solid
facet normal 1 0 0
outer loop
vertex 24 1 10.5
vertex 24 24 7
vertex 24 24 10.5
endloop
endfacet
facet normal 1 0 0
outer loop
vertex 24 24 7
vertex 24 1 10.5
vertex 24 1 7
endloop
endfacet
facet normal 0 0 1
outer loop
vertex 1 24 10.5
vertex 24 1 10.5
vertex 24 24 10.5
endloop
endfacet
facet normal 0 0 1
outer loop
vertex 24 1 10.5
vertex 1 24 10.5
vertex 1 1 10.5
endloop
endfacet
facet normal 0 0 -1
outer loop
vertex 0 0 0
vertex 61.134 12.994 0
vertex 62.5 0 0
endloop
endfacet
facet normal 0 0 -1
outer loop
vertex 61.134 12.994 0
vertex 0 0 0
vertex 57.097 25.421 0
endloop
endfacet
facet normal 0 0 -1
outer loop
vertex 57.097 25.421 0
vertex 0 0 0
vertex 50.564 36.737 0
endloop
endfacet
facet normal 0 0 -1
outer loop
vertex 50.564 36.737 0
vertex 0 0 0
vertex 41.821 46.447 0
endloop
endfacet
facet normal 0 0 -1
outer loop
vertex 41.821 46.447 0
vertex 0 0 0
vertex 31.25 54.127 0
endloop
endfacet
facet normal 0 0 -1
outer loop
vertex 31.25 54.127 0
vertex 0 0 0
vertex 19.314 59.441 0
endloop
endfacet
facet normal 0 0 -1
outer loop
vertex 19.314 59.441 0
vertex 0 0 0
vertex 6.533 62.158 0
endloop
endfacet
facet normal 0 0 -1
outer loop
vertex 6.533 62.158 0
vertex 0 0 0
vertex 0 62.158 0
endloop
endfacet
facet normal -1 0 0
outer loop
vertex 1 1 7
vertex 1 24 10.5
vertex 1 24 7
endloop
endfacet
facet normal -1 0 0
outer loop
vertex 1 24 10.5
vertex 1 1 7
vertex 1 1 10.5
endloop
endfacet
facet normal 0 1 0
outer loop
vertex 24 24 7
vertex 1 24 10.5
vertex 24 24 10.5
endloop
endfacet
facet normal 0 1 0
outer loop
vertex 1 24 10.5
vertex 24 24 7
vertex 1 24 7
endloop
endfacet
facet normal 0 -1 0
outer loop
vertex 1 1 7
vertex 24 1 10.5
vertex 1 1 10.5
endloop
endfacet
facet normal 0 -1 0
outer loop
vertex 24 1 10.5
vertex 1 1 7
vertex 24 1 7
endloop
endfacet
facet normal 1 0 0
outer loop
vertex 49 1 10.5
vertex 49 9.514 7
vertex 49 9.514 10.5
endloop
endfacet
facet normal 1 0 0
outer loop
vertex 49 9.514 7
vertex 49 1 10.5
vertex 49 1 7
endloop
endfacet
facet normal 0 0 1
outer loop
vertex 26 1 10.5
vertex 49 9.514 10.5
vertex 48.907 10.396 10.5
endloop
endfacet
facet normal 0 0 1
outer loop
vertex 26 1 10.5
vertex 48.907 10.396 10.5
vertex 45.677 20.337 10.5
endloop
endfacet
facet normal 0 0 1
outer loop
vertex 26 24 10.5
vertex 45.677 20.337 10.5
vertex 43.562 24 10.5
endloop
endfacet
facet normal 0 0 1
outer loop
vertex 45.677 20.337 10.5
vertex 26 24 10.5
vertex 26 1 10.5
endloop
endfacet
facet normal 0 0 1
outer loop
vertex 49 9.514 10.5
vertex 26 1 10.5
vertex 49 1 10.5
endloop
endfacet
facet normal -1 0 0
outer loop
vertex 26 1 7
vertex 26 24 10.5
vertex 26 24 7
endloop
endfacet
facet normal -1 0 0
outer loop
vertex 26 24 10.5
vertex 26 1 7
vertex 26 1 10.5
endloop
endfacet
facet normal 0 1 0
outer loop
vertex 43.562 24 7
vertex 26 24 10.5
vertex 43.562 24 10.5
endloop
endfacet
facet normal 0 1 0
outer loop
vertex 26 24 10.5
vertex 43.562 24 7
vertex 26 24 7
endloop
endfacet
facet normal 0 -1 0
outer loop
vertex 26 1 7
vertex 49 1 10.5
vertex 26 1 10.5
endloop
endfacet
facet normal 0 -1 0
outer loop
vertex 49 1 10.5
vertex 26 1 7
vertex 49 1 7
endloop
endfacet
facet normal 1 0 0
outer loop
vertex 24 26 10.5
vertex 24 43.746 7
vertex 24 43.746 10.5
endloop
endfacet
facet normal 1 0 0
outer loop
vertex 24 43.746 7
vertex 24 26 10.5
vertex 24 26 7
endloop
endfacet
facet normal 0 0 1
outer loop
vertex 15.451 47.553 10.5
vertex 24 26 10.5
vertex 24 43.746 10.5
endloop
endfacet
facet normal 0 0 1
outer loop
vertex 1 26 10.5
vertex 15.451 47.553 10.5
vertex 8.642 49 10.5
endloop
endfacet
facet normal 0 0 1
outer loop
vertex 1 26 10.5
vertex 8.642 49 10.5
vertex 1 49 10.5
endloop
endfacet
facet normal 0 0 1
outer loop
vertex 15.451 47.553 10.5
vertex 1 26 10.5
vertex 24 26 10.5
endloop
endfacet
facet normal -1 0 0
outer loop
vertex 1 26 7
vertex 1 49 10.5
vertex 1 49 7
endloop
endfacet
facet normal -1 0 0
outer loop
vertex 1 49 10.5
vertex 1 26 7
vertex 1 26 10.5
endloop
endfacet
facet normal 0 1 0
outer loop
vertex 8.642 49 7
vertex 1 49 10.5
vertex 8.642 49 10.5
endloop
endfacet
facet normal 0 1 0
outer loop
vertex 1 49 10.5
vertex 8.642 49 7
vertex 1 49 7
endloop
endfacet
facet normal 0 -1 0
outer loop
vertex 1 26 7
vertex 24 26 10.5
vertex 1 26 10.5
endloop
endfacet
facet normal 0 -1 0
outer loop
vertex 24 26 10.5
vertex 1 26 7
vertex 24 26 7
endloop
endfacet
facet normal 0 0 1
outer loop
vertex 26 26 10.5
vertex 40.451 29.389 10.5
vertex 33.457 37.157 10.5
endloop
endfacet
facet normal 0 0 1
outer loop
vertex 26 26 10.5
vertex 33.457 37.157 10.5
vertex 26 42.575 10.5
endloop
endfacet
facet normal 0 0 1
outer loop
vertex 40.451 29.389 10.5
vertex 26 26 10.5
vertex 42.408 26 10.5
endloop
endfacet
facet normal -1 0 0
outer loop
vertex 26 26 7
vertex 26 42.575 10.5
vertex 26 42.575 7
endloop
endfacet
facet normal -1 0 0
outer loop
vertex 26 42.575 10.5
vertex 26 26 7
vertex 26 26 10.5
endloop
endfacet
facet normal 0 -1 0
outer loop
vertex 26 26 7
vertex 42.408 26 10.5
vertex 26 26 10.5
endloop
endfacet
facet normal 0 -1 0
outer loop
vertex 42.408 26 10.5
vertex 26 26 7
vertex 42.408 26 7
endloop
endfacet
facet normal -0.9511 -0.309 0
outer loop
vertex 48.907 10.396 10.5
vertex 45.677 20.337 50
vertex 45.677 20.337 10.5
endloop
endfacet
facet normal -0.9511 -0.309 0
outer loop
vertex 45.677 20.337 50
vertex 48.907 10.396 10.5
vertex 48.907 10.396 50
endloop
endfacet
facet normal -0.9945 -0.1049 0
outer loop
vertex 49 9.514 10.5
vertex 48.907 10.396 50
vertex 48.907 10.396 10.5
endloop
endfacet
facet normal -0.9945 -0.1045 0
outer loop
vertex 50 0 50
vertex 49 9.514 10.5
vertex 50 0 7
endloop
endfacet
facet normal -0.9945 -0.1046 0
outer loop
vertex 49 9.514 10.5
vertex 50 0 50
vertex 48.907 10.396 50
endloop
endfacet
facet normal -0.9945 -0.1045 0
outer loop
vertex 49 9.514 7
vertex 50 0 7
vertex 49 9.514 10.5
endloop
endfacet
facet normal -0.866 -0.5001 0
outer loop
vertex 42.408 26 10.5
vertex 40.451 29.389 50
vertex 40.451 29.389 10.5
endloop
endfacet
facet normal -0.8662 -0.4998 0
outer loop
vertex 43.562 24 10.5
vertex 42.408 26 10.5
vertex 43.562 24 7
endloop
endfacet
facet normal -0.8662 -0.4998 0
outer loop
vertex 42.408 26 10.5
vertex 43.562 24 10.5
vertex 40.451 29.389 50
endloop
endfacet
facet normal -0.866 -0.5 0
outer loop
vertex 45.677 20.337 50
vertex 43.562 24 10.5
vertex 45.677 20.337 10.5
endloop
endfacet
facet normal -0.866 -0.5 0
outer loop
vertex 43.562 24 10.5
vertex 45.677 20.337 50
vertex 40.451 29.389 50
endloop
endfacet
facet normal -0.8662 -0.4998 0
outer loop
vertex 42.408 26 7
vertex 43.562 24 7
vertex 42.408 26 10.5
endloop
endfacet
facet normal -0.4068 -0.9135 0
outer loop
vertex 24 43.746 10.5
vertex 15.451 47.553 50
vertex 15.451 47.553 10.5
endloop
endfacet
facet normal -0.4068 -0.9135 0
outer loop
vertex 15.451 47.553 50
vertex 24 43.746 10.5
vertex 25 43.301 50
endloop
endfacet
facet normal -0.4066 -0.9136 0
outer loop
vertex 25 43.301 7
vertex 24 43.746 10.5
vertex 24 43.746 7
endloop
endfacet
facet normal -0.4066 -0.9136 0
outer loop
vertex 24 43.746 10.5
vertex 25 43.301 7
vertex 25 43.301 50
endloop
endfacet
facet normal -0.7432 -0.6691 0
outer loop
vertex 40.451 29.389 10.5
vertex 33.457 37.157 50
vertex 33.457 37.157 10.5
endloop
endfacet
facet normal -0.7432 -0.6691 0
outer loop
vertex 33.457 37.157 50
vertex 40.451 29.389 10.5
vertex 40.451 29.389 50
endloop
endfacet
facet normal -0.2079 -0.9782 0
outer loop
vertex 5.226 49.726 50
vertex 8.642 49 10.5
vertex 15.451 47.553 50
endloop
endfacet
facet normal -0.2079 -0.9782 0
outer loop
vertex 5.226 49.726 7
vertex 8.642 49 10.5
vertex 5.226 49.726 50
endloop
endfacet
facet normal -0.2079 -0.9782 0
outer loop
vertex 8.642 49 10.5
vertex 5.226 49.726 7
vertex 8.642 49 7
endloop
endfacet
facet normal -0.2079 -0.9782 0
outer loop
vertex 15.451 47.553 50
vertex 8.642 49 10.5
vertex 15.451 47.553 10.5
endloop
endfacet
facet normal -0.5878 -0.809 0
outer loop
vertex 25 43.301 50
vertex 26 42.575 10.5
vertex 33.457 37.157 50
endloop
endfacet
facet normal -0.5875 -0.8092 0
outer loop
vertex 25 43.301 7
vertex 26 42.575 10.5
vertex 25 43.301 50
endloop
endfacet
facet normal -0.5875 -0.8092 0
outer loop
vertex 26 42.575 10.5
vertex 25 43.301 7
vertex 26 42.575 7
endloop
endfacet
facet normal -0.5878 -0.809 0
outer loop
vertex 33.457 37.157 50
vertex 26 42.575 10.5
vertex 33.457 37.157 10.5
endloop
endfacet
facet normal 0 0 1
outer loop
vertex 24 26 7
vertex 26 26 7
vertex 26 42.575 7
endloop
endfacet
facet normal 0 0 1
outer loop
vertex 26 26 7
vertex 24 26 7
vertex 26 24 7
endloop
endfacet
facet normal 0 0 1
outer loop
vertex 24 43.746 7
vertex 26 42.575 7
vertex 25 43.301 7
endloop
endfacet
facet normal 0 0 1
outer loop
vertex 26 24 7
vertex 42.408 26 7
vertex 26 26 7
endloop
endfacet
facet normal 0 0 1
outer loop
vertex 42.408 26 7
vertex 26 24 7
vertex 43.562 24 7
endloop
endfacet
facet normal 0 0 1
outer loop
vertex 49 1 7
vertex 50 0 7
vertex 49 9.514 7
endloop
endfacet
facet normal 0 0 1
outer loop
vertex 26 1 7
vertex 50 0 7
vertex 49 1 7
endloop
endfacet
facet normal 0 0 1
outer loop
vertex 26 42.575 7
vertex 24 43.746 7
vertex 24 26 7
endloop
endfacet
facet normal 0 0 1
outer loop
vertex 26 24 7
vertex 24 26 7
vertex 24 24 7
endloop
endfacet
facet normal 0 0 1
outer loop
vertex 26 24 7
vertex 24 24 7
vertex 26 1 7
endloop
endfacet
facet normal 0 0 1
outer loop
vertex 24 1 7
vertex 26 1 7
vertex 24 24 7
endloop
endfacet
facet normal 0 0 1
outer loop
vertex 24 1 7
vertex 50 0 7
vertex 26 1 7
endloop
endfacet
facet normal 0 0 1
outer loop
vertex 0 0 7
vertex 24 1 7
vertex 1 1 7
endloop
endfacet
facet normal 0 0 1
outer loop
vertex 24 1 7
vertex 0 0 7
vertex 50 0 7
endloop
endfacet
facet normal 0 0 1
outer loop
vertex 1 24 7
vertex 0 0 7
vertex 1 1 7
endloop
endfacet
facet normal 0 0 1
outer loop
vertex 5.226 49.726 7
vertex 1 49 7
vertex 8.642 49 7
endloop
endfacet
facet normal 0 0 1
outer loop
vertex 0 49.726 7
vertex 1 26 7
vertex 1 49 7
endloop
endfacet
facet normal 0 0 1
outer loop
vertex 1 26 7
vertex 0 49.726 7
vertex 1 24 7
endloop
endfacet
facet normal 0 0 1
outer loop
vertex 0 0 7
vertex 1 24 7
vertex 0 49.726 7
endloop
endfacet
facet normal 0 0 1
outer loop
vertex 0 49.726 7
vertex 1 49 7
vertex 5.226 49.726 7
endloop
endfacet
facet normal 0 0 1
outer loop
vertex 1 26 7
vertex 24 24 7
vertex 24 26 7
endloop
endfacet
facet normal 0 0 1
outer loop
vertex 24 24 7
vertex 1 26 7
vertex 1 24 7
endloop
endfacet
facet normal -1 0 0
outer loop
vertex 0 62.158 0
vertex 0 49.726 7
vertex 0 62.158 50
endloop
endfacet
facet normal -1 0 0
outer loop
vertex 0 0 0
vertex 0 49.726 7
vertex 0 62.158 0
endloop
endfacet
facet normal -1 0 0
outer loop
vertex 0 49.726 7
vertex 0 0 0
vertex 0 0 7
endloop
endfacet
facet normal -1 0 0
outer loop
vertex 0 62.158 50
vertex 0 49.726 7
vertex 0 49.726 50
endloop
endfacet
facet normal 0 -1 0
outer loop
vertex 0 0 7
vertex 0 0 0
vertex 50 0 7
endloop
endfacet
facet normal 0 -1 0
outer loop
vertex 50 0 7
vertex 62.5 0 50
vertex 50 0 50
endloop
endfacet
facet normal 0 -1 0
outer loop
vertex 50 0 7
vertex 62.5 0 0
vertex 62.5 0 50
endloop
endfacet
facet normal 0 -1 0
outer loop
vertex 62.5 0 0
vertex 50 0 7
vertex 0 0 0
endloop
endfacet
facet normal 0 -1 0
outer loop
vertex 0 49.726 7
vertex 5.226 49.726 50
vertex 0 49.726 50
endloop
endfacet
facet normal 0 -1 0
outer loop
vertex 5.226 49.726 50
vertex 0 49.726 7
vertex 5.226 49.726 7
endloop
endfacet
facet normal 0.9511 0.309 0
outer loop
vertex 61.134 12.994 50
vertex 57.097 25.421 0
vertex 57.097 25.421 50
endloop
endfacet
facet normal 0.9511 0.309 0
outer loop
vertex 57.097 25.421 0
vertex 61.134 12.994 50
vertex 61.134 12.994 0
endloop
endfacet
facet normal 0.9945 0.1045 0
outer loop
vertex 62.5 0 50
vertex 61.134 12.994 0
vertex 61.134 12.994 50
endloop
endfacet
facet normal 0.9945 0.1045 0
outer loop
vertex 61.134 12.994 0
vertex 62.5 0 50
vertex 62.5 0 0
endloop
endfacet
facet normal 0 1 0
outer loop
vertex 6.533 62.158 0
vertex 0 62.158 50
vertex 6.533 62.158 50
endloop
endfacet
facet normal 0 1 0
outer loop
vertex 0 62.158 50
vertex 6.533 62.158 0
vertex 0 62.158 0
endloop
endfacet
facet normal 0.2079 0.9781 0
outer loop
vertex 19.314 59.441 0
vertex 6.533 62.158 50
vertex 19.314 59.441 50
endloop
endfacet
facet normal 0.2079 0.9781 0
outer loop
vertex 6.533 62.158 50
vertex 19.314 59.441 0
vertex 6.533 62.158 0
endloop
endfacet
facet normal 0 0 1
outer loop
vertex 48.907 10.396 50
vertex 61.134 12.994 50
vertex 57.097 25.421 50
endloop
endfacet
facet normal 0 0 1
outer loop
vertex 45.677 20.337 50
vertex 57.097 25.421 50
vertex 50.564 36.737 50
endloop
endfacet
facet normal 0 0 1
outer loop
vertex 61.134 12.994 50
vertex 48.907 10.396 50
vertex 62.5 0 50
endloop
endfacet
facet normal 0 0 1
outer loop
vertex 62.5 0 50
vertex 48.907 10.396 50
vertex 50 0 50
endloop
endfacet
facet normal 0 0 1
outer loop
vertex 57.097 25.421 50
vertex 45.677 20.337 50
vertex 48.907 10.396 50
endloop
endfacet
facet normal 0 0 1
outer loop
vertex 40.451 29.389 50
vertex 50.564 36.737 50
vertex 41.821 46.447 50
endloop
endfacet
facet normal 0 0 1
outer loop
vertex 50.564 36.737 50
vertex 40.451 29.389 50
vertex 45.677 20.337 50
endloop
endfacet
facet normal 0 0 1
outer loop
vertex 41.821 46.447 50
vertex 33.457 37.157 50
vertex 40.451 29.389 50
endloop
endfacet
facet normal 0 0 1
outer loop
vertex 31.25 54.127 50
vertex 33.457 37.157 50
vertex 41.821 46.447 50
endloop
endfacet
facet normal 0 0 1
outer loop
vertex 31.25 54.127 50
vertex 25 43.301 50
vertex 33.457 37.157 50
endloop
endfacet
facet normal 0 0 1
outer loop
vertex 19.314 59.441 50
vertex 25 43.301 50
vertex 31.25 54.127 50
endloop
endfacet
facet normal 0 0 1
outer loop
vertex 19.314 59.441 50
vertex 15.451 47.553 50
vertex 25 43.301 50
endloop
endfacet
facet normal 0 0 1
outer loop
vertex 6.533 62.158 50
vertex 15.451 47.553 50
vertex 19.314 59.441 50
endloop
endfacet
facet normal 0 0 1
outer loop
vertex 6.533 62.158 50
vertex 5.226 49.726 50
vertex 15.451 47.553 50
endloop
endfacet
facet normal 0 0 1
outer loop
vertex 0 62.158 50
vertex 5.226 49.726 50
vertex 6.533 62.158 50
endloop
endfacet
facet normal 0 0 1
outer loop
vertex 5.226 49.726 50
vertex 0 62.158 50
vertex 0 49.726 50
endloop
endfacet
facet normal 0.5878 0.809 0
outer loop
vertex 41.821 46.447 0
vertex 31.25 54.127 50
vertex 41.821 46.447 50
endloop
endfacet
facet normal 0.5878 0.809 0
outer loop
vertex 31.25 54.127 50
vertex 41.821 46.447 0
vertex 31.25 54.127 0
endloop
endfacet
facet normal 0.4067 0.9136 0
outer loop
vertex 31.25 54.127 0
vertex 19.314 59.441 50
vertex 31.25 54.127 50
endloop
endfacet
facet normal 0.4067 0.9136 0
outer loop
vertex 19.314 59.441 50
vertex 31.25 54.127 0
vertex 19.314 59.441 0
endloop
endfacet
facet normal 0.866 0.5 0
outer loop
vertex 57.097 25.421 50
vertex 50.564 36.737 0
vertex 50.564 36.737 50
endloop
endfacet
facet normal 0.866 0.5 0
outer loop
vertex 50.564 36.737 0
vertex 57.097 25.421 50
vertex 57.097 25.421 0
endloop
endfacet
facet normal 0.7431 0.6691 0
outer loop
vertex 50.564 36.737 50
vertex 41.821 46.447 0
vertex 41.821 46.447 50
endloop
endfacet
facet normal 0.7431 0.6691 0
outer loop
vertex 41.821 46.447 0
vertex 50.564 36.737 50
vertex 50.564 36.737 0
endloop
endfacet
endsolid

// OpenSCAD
color("LightGray") {
    intersection() {
        union() {
            translate([1,1,0]) cube([23,23,6+4.5]);
            translate([25+1,1,0]) cube([23,23,6+4.5]);
            translate([1,25+1,0]) cube([23,23,6+4.5]);
            translate([25+1,25+1,0]) cube([23,23,6+4.5]);
        }
        cylinder(50,50,50);
    }
}

color("Grey") {
    intersection() {
        cube([50,50,7]);
        cylinder(50,50,50);
    }
    intersection() {
        difference() {
            cylinder(50,50+12.5,50+12.5);
            translate([0,0,-1]) cylinder(52,50,50);
        }
        cube([50+12.5,50+12.5,50]);
    }
}
